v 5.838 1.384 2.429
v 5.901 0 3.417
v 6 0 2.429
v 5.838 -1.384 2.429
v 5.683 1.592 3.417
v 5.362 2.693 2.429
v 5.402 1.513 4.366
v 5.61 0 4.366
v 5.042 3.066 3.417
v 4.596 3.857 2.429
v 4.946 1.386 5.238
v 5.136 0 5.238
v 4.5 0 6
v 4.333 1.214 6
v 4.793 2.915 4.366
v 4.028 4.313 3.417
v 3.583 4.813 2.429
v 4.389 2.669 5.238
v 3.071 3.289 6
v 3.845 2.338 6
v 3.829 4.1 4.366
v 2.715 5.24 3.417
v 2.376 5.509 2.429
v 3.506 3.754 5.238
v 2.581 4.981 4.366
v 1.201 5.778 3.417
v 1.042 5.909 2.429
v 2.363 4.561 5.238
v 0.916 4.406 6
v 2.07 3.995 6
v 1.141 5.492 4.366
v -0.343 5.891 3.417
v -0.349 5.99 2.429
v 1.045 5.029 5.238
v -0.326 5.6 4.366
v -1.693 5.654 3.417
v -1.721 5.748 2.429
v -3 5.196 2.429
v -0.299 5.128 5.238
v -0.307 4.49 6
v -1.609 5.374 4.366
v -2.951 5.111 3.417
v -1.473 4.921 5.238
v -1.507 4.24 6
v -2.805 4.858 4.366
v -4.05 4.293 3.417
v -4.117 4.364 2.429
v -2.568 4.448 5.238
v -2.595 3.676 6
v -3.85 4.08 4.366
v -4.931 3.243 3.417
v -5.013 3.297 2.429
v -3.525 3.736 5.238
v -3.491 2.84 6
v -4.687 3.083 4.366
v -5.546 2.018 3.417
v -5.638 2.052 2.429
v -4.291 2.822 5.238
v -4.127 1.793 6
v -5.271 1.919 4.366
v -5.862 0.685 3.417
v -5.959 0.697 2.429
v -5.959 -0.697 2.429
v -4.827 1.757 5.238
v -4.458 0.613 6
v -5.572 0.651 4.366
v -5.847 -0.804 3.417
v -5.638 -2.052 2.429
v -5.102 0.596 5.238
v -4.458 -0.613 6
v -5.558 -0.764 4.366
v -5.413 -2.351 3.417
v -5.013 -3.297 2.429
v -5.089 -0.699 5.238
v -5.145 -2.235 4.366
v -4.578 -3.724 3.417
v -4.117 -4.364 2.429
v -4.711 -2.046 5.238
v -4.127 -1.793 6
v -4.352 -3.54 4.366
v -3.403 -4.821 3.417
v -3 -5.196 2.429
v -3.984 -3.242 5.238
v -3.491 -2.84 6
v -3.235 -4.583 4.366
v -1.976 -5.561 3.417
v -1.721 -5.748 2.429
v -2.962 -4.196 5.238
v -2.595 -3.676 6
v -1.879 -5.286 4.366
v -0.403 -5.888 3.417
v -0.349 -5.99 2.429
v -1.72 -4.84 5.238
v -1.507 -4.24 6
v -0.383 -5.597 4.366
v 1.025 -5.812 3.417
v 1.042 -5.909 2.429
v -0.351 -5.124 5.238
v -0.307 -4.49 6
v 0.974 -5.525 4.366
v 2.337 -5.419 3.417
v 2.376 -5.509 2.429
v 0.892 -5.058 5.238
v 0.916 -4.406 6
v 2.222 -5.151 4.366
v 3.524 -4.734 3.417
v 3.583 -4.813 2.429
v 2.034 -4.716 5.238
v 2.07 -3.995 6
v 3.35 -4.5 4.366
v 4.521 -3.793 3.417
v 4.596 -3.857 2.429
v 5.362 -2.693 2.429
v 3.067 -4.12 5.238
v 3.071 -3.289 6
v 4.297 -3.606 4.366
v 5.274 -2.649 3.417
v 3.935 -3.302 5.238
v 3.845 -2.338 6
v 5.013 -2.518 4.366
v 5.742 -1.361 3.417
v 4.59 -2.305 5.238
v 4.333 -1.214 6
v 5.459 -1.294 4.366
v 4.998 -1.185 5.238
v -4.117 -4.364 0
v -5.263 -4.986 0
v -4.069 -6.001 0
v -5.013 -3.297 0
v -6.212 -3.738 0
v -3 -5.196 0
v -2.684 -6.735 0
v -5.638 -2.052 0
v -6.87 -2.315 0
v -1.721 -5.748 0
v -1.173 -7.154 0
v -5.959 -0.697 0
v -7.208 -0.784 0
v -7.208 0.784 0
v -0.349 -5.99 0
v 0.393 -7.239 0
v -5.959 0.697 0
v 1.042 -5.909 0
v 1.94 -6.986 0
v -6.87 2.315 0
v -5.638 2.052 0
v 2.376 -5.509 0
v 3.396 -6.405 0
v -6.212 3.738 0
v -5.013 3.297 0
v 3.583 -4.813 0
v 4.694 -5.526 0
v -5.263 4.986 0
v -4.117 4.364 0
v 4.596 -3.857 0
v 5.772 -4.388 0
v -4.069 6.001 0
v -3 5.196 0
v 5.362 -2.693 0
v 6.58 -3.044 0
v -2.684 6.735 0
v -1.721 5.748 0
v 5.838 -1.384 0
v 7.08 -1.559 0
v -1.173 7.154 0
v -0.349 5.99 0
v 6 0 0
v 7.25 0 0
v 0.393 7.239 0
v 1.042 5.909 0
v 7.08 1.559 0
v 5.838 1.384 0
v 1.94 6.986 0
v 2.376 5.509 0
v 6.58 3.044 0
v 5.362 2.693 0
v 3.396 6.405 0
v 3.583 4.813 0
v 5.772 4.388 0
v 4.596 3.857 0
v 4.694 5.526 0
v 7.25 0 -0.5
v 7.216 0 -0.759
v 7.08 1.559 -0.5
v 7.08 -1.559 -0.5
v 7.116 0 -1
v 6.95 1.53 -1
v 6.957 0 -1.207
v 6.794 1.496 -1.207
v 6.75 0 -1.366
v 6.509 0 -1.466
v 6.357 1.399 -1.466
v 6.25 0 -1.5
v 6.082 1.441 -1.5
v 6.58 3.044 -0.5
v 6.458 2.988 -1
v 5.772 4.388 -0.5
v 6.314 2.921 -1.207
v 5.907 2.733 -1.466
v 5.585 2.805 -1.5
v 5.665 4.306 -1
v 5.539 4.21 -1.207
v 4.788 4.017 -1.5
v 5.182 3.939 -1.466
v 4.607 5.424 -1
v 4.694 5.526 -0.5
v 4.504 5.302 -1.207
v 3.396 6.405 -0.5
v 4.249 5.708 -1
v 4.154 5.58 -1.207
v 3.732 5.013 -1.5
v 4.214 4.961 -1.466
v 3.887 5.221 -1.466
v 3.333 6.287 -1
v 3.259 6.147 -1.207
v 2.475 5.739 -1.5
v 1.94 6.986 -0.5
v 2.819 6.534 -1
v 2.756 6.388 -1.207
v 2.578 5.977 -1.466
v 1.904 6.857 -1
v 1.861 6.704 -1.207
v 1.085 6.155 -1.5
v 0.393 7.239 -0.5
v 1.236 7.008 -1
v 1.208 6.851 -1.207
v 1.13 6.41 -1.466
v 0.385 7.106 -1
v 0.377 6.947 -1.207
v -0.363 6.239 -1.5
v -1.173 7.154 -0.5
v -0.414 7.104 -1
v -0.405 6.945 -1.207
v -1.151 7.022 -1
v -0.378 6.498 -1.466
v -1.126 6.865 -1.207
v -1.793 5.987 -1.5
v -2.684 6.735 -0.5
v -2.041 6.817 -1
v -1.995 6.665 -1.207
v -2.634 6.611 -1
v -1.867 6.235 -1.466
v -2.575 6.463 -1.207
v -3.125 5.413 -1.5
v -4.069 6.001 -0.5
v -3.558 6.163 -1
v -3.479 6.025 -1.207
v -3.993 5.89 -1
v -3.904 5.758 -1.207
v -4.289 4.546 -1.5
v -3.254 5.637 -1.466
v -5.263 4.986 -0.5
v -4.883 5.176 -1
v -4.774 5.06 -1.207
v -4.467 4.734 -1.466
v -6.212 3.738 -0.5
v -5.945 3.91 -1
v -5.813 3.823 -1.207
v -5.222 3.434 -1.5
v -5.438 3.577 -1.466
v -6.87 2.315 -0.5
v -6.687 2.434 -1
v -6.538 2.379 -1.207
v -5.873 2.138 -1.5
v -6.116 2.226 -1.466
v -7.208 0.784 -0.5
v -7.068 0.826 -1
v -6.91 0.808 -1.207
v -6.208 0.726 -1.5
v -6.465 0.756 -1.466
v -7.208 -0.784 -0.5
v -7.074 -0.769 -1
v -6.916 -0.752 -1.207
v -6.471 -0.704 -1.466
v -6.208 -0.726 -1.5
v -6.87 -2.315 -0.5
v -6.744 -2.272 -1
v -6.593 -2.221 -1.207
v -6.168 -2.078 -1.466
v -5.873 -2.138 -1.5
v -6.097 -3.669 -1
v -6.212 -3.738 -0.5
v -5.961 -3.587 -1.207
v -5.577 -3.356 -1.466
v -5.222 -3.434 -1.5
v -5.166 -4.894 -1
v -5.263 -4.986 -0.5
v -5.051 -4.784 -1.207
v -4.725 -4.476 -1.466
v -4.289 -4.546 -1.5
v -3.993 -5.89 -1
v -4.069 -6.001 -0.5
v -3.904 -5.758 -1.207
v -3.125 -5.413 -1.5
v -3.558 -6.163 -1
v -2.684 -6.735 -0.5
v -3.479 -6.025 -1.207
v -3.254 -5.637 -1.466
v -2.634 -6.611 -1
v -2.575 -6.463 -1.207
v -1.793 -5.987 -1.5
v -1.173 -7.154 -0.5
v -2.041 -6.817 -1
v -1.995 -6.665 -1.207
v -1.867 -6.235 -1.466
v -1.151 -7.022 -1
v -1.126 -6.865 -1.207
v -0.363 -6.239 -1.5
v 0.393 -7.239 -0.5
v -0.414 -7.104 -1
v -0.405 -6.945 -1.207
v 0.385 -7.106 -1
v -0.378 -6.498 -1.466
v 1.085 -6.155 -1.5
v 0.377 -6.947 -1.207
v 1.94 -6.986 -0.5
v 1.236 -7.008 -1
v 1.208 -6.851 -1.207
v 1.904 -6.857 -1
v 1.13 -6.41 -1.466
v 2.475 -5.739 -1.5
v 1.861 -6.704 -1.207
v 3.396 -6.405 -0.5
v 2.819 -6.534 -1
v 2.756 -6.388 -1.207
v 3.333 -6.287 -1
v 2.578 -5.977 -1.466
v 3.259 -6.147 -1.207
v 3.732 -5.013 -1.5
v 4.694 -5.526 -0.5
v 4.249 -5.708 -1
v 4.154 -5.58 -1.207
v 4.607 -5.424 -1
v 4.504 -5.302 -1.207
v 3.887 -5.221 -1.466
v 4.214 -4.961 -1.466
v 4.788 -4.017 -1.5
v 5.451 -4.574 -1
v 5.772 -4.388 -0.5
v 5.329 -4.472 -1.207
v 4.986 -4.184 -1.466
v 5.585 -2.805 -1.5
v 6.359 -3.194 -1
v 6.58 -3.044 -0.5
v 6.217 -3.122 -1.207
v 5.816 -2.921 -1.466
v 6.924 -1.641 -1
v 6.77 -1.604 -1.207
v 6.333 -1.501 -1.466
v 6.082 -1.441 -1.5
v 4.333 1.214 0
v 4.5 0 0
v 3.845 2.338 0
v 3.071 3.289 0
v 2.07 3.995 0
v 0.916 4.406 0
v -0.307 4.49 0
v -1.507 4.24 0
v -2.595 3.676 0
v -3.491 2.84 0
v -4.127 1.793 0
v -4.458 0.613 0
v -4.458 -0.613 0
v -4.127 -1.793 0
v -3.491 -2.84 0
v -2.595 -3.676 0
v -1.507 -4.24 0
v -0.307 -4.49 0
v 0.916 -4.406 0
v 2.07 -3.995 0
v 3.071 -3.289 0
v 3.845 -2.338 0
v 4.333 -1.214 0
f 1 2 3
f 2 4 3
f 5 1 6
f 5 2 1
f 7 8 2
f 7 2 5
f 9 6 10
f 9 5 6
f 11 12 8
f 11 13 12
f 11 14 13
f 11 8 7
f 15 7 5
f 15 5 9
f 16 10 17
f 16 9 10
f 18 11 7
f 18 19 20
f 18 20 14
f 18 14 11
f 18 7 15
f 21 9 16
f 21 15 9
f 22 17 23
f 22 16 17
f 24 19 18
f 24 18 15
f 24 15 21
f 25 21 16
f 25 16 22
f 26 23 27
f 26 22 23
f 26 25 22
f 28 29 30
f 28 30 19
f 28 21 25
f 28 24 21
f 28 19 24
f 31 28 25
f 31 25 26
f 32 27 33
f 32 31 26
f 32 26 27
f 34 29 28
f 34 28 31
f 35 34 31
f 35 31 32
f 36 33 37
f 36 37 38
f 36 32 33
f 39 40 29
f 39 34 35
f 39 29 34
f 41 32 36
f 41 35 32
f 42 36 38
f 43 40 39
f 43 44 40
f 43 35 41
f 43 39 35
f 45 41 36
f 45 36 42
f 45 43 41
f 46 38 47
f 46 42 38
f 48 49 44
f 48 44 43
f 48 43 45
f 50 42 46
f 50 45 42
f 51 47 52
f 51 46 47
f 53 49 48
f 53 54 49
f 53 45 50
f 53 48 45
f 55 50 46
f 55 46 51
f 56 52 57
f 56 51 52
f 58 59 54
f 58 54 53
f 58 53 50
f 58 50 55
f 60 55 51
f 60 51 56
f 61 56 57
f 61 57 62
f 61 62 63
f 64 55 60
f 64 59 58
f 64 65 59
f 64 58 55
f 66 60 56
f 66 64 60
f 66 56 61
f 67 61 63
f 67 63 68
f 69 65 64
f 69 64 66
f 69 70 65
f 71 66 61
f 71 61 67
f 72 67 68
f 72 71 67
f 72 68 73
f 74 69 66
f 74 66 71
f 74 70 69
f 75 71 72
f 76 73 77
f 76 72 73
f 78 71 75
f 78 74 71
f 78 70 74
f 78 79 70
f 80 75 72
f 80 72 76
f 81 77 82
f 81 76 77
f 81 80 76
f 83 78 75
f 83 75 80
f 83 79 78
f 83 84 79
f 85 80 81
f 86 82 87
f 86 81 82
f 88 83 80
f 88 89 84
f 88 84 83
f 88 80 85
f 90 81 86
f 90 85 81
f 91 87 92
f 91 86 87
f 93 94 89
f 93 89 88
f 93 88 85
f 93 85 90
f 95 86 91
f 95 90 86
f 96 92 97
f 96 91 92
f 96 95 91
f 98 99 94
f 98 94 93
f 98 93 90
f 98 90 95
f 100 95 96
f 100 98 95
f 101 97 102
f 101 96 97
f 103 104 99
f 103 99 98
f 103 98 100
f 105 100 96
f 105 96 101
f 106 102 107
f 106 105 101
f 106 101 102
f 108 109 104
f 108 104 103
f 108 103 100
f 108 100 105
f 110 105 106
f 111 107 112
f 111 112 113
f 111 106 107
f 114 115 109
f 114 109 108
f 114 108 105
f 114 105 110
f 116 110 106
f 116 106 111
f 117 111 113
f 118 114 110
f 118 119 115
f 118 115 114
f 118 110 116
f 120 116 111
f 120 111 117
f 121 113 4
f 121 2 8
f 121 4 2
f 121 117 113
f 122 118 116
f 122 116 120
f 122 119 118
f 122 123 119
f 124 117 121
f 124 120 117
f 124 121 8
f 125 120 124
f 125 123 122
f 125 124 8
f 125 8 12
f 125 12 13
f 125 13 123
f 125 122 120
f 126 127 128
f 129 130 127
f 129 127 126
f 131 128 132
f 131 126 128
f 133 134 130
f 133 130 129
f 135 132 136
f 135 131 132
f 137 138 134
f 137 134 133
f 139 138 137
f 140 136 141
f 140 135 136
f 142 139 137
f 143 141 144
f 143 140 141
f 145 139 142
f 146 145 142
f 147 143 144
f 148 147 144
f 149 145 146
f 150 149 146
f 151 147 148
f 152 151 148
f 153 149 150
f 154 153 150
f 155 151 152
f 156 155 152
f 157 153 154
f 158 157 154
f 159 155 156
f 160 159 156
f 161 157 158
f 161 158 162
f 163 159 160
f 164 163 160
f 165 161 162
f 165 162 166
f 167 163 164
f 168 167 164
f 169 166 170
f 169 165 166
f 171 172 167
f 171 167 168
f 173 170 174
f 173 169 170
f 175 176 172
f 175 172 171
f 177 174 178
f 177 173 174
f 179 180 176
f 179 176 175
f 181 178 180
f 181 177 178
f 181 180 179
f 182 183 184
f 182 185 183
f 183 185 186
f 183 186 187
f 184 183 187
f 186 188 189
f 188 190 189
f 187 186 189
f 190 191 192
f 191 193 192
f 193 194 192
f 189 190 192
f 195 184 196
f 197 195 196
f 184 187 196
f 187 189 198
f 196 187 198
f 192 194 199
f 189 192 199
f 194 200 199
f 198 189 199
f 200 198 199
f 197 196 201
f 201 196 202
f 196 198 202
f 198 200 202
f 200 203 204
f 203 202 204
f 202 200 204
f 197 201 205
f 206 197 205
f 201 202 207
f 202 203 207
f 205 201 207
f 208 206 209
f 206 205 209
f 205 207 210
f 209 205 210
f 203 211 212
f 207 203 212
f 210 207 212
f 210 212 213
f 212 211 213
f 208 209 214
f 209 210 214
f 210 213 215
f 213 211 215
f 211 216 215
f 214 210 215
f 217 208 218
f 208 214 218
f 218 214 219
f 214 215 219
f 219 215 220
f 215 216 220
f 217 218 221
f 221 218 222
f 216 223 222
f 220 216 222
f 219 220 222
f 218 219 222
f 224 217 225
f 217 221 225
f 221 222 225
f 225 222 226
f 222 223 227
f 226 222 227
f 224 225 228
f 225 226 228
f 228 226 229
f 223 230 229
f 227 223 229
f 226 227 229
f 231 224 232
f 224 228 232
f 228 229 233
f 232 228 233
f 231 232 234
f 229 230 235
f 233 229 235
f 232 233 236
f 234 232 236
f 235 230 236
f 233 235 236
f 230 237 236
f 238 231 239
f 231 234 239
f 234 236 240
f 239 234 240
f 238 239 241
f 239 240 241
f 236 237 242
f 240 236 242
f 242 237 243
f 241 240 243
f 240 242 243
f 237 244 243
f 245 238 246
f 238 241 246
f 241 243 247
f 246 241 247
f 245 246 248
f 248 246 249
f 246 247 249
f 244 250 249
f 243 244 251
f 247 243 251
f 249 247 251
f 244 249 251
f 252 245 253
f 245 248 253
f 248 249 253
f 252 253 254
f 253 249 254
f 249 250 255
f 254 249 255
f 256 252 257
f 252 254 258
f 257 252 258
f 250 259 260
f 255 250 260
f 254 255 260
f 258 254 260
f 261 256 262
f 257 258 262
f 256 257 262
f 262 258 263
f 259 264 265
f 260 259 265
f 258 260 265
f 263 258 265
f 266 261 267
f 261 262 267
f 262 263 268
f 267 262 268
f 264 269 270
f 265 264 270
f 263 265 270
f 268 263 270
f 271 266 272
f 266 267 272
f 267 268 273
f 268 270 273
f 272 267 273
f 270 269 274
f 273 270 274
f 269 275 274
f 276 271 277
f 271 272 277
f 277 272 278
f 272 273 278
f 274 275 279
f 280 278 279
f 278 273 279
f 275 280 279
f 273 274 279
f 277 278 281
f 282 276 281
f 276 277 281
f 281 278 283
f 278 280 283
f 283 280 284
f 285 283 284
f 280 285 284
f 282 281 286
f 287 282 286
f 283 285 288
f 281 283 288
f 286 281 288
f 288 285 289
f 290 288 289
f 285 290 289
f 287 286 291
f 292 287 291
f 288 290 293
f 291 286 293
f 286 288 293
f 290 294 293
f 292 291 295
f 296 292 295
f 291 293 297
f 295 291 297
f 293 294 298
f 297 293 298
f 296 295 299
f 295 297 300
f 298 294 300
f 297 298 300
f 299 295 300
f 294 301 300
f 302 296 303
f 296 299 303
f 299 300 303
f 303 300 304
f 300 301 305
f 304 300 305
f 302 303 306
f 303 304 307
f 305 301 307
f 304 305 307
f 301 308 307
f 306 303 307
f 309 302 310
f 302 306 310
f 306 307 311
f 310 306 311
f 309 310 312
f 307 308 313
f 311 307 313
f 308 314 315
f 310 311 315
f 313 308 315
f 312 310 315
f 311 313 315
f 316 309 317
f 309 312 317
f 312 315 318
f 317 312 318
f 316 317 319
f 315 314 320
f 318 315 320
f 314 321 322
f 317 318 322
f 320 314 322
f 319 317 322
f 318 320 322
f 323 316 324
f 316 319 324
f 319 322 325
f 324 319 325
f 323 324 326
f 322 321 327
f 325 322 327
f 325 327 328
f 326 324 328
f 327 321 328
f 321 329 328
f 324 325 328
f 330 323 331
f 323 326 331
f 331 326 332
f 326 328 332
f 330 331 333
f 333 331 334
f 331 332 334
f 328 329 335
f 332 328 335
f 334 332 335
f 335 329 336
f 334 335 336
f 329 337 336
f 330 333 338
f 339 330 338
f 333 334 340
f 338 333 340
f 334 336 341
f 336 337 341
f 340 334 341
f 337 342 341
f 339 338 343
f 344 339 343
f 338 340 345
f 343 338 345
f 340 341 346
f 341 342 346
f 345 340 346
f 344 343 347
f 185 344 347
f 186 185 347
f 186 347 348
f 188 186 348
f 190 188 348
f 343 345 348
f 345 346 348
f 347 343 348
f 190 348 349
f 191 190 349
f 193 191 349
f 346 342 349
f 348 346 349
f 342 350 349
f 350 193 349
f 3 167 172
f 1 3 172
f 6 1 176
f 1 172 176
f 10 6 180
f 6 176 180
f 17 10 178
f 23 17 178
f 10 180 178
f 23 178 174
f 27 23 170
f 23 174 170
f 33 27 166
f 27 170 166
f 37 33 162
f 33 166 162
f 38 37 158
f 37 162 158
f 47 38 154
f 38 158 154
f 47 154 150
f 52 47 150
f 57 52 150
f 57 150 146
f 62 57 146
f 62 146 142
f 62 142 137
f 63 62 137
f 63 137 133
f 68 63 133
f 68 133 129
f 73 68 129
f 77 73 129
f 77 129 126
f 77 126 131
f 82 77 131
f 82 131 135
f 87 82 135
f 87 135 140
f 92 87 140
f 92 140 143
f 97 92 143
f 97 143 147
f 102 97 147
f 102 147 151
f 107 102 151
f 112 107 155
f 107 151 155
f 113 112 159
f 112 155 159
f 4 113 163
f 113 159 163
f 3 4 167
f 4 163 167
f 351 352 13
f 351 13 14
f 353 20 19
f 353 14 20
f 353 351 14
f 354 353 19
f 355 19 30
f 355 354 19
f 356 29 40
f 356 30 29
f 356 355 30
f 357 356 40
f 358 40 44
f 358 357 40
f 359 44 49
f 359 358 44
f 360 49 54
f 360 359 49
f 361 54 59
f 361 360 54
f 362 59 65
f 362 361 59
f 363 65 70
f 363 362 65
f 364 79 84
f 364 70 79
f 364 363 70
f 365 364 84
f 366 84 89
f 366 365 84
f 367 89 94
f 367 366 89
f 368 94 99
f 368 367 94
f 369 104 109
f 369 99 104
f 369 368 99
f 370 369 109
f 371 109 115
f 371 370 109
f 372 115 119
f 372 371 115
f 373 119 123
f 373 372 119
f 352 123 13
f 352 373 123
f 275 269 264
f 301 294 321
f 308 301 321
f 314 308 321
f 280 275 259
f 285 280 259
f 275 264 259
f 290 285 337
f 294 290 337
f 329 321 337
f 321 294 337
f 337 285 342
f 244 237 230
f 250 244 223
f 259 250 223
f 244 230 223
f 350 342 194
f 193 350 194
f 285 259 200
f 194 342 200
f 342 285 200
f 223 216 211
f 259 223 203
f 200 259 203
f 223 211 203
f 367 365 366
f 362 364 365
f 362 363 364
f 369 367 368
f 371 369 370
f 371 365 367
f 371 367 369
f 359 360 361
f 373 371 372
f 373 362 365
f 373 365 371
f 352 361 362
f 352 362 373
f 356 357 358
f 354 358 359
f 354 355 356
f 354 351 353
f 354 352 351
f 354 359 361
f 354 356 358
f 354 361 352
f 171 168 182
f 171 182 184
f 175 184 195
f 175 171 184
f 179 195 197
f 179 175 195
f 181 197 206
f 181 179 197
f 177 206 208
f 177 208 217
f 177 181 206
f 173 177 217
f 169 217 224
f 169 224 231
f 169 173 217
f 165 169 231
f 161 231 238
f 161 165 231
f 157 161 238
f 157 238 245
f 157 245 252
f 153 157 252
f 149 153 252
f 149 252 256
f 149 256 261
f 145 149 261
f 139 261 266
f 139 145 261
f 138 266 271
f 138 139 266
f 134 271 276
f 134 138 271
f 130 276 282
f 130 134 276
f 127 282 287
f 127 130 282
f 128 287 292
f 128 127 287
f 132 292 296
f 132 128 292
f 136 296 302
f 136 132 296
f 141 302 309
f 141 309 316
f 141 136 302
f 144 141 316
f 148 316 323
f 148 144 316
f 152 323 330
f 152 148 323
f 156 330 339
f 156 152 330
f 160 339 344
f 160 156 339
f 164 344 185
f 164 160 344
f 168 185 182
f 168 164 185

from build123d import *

# Parameters (mm, degrees)
F0_R     = 7.25
F1_DEPTH = 1.5
F2_R     = 6
F3_DEPTH = 6
F4_T     = -1.5
F5_R     = 1


# Not quite as in the source:
# - a fillet or chamfer that OpenCascade refuses, or shapes differently, is made with other operations: its cross-section is extruded or revolved along the edge and cut away or added


with BuildPart() as f1:
    # F0 (on Top) → F1 (new body)
    with BuildSketch(Plane.XY):
        Circle(F0_R)
    extrude(amount=-F1_DEPTH)

    # F2 (on face) → F3 (join)
    with BuildSketch(Plane.XY):
        Circle(F2_R)
    extrude(amount=F3_DEPTH)

    # F4
    f4_openings = [f1.faces().sort_by_distance(p)[0] for p in [
        (0, 0, 6),
    ]]
    offset(amount=F4_T, openings=f4_openings, kind=Kind.INTERSECTION)

    # F5
    f5_edges = [f1.edges().sort_by_distance(p)[0] for p in [
        (-7.25, 0, -1.5),
    ]]
    fillet(f5_edges, radius=F5_R)

    # F6: fillet of radius 5 on 1 edges, made by hand

    # F6_s1 → F6_t2 (revolve, cut)
    with BuildSketch(Plane.XZ):
        with BuildLine():
            ThreePointArc((6, 2.4292857857), (5.6097722286, 4.3657774588), (4.5, 6))
            Line((4.5, 6), (6, 6))
            Line((6, 6), (6, 2.4292857857))
        make_face()
    revolve(axis=Axis((0, 0, 6), (0, 0, 1)), mode=Mode.SUBTRACT)


solid = f1.part
